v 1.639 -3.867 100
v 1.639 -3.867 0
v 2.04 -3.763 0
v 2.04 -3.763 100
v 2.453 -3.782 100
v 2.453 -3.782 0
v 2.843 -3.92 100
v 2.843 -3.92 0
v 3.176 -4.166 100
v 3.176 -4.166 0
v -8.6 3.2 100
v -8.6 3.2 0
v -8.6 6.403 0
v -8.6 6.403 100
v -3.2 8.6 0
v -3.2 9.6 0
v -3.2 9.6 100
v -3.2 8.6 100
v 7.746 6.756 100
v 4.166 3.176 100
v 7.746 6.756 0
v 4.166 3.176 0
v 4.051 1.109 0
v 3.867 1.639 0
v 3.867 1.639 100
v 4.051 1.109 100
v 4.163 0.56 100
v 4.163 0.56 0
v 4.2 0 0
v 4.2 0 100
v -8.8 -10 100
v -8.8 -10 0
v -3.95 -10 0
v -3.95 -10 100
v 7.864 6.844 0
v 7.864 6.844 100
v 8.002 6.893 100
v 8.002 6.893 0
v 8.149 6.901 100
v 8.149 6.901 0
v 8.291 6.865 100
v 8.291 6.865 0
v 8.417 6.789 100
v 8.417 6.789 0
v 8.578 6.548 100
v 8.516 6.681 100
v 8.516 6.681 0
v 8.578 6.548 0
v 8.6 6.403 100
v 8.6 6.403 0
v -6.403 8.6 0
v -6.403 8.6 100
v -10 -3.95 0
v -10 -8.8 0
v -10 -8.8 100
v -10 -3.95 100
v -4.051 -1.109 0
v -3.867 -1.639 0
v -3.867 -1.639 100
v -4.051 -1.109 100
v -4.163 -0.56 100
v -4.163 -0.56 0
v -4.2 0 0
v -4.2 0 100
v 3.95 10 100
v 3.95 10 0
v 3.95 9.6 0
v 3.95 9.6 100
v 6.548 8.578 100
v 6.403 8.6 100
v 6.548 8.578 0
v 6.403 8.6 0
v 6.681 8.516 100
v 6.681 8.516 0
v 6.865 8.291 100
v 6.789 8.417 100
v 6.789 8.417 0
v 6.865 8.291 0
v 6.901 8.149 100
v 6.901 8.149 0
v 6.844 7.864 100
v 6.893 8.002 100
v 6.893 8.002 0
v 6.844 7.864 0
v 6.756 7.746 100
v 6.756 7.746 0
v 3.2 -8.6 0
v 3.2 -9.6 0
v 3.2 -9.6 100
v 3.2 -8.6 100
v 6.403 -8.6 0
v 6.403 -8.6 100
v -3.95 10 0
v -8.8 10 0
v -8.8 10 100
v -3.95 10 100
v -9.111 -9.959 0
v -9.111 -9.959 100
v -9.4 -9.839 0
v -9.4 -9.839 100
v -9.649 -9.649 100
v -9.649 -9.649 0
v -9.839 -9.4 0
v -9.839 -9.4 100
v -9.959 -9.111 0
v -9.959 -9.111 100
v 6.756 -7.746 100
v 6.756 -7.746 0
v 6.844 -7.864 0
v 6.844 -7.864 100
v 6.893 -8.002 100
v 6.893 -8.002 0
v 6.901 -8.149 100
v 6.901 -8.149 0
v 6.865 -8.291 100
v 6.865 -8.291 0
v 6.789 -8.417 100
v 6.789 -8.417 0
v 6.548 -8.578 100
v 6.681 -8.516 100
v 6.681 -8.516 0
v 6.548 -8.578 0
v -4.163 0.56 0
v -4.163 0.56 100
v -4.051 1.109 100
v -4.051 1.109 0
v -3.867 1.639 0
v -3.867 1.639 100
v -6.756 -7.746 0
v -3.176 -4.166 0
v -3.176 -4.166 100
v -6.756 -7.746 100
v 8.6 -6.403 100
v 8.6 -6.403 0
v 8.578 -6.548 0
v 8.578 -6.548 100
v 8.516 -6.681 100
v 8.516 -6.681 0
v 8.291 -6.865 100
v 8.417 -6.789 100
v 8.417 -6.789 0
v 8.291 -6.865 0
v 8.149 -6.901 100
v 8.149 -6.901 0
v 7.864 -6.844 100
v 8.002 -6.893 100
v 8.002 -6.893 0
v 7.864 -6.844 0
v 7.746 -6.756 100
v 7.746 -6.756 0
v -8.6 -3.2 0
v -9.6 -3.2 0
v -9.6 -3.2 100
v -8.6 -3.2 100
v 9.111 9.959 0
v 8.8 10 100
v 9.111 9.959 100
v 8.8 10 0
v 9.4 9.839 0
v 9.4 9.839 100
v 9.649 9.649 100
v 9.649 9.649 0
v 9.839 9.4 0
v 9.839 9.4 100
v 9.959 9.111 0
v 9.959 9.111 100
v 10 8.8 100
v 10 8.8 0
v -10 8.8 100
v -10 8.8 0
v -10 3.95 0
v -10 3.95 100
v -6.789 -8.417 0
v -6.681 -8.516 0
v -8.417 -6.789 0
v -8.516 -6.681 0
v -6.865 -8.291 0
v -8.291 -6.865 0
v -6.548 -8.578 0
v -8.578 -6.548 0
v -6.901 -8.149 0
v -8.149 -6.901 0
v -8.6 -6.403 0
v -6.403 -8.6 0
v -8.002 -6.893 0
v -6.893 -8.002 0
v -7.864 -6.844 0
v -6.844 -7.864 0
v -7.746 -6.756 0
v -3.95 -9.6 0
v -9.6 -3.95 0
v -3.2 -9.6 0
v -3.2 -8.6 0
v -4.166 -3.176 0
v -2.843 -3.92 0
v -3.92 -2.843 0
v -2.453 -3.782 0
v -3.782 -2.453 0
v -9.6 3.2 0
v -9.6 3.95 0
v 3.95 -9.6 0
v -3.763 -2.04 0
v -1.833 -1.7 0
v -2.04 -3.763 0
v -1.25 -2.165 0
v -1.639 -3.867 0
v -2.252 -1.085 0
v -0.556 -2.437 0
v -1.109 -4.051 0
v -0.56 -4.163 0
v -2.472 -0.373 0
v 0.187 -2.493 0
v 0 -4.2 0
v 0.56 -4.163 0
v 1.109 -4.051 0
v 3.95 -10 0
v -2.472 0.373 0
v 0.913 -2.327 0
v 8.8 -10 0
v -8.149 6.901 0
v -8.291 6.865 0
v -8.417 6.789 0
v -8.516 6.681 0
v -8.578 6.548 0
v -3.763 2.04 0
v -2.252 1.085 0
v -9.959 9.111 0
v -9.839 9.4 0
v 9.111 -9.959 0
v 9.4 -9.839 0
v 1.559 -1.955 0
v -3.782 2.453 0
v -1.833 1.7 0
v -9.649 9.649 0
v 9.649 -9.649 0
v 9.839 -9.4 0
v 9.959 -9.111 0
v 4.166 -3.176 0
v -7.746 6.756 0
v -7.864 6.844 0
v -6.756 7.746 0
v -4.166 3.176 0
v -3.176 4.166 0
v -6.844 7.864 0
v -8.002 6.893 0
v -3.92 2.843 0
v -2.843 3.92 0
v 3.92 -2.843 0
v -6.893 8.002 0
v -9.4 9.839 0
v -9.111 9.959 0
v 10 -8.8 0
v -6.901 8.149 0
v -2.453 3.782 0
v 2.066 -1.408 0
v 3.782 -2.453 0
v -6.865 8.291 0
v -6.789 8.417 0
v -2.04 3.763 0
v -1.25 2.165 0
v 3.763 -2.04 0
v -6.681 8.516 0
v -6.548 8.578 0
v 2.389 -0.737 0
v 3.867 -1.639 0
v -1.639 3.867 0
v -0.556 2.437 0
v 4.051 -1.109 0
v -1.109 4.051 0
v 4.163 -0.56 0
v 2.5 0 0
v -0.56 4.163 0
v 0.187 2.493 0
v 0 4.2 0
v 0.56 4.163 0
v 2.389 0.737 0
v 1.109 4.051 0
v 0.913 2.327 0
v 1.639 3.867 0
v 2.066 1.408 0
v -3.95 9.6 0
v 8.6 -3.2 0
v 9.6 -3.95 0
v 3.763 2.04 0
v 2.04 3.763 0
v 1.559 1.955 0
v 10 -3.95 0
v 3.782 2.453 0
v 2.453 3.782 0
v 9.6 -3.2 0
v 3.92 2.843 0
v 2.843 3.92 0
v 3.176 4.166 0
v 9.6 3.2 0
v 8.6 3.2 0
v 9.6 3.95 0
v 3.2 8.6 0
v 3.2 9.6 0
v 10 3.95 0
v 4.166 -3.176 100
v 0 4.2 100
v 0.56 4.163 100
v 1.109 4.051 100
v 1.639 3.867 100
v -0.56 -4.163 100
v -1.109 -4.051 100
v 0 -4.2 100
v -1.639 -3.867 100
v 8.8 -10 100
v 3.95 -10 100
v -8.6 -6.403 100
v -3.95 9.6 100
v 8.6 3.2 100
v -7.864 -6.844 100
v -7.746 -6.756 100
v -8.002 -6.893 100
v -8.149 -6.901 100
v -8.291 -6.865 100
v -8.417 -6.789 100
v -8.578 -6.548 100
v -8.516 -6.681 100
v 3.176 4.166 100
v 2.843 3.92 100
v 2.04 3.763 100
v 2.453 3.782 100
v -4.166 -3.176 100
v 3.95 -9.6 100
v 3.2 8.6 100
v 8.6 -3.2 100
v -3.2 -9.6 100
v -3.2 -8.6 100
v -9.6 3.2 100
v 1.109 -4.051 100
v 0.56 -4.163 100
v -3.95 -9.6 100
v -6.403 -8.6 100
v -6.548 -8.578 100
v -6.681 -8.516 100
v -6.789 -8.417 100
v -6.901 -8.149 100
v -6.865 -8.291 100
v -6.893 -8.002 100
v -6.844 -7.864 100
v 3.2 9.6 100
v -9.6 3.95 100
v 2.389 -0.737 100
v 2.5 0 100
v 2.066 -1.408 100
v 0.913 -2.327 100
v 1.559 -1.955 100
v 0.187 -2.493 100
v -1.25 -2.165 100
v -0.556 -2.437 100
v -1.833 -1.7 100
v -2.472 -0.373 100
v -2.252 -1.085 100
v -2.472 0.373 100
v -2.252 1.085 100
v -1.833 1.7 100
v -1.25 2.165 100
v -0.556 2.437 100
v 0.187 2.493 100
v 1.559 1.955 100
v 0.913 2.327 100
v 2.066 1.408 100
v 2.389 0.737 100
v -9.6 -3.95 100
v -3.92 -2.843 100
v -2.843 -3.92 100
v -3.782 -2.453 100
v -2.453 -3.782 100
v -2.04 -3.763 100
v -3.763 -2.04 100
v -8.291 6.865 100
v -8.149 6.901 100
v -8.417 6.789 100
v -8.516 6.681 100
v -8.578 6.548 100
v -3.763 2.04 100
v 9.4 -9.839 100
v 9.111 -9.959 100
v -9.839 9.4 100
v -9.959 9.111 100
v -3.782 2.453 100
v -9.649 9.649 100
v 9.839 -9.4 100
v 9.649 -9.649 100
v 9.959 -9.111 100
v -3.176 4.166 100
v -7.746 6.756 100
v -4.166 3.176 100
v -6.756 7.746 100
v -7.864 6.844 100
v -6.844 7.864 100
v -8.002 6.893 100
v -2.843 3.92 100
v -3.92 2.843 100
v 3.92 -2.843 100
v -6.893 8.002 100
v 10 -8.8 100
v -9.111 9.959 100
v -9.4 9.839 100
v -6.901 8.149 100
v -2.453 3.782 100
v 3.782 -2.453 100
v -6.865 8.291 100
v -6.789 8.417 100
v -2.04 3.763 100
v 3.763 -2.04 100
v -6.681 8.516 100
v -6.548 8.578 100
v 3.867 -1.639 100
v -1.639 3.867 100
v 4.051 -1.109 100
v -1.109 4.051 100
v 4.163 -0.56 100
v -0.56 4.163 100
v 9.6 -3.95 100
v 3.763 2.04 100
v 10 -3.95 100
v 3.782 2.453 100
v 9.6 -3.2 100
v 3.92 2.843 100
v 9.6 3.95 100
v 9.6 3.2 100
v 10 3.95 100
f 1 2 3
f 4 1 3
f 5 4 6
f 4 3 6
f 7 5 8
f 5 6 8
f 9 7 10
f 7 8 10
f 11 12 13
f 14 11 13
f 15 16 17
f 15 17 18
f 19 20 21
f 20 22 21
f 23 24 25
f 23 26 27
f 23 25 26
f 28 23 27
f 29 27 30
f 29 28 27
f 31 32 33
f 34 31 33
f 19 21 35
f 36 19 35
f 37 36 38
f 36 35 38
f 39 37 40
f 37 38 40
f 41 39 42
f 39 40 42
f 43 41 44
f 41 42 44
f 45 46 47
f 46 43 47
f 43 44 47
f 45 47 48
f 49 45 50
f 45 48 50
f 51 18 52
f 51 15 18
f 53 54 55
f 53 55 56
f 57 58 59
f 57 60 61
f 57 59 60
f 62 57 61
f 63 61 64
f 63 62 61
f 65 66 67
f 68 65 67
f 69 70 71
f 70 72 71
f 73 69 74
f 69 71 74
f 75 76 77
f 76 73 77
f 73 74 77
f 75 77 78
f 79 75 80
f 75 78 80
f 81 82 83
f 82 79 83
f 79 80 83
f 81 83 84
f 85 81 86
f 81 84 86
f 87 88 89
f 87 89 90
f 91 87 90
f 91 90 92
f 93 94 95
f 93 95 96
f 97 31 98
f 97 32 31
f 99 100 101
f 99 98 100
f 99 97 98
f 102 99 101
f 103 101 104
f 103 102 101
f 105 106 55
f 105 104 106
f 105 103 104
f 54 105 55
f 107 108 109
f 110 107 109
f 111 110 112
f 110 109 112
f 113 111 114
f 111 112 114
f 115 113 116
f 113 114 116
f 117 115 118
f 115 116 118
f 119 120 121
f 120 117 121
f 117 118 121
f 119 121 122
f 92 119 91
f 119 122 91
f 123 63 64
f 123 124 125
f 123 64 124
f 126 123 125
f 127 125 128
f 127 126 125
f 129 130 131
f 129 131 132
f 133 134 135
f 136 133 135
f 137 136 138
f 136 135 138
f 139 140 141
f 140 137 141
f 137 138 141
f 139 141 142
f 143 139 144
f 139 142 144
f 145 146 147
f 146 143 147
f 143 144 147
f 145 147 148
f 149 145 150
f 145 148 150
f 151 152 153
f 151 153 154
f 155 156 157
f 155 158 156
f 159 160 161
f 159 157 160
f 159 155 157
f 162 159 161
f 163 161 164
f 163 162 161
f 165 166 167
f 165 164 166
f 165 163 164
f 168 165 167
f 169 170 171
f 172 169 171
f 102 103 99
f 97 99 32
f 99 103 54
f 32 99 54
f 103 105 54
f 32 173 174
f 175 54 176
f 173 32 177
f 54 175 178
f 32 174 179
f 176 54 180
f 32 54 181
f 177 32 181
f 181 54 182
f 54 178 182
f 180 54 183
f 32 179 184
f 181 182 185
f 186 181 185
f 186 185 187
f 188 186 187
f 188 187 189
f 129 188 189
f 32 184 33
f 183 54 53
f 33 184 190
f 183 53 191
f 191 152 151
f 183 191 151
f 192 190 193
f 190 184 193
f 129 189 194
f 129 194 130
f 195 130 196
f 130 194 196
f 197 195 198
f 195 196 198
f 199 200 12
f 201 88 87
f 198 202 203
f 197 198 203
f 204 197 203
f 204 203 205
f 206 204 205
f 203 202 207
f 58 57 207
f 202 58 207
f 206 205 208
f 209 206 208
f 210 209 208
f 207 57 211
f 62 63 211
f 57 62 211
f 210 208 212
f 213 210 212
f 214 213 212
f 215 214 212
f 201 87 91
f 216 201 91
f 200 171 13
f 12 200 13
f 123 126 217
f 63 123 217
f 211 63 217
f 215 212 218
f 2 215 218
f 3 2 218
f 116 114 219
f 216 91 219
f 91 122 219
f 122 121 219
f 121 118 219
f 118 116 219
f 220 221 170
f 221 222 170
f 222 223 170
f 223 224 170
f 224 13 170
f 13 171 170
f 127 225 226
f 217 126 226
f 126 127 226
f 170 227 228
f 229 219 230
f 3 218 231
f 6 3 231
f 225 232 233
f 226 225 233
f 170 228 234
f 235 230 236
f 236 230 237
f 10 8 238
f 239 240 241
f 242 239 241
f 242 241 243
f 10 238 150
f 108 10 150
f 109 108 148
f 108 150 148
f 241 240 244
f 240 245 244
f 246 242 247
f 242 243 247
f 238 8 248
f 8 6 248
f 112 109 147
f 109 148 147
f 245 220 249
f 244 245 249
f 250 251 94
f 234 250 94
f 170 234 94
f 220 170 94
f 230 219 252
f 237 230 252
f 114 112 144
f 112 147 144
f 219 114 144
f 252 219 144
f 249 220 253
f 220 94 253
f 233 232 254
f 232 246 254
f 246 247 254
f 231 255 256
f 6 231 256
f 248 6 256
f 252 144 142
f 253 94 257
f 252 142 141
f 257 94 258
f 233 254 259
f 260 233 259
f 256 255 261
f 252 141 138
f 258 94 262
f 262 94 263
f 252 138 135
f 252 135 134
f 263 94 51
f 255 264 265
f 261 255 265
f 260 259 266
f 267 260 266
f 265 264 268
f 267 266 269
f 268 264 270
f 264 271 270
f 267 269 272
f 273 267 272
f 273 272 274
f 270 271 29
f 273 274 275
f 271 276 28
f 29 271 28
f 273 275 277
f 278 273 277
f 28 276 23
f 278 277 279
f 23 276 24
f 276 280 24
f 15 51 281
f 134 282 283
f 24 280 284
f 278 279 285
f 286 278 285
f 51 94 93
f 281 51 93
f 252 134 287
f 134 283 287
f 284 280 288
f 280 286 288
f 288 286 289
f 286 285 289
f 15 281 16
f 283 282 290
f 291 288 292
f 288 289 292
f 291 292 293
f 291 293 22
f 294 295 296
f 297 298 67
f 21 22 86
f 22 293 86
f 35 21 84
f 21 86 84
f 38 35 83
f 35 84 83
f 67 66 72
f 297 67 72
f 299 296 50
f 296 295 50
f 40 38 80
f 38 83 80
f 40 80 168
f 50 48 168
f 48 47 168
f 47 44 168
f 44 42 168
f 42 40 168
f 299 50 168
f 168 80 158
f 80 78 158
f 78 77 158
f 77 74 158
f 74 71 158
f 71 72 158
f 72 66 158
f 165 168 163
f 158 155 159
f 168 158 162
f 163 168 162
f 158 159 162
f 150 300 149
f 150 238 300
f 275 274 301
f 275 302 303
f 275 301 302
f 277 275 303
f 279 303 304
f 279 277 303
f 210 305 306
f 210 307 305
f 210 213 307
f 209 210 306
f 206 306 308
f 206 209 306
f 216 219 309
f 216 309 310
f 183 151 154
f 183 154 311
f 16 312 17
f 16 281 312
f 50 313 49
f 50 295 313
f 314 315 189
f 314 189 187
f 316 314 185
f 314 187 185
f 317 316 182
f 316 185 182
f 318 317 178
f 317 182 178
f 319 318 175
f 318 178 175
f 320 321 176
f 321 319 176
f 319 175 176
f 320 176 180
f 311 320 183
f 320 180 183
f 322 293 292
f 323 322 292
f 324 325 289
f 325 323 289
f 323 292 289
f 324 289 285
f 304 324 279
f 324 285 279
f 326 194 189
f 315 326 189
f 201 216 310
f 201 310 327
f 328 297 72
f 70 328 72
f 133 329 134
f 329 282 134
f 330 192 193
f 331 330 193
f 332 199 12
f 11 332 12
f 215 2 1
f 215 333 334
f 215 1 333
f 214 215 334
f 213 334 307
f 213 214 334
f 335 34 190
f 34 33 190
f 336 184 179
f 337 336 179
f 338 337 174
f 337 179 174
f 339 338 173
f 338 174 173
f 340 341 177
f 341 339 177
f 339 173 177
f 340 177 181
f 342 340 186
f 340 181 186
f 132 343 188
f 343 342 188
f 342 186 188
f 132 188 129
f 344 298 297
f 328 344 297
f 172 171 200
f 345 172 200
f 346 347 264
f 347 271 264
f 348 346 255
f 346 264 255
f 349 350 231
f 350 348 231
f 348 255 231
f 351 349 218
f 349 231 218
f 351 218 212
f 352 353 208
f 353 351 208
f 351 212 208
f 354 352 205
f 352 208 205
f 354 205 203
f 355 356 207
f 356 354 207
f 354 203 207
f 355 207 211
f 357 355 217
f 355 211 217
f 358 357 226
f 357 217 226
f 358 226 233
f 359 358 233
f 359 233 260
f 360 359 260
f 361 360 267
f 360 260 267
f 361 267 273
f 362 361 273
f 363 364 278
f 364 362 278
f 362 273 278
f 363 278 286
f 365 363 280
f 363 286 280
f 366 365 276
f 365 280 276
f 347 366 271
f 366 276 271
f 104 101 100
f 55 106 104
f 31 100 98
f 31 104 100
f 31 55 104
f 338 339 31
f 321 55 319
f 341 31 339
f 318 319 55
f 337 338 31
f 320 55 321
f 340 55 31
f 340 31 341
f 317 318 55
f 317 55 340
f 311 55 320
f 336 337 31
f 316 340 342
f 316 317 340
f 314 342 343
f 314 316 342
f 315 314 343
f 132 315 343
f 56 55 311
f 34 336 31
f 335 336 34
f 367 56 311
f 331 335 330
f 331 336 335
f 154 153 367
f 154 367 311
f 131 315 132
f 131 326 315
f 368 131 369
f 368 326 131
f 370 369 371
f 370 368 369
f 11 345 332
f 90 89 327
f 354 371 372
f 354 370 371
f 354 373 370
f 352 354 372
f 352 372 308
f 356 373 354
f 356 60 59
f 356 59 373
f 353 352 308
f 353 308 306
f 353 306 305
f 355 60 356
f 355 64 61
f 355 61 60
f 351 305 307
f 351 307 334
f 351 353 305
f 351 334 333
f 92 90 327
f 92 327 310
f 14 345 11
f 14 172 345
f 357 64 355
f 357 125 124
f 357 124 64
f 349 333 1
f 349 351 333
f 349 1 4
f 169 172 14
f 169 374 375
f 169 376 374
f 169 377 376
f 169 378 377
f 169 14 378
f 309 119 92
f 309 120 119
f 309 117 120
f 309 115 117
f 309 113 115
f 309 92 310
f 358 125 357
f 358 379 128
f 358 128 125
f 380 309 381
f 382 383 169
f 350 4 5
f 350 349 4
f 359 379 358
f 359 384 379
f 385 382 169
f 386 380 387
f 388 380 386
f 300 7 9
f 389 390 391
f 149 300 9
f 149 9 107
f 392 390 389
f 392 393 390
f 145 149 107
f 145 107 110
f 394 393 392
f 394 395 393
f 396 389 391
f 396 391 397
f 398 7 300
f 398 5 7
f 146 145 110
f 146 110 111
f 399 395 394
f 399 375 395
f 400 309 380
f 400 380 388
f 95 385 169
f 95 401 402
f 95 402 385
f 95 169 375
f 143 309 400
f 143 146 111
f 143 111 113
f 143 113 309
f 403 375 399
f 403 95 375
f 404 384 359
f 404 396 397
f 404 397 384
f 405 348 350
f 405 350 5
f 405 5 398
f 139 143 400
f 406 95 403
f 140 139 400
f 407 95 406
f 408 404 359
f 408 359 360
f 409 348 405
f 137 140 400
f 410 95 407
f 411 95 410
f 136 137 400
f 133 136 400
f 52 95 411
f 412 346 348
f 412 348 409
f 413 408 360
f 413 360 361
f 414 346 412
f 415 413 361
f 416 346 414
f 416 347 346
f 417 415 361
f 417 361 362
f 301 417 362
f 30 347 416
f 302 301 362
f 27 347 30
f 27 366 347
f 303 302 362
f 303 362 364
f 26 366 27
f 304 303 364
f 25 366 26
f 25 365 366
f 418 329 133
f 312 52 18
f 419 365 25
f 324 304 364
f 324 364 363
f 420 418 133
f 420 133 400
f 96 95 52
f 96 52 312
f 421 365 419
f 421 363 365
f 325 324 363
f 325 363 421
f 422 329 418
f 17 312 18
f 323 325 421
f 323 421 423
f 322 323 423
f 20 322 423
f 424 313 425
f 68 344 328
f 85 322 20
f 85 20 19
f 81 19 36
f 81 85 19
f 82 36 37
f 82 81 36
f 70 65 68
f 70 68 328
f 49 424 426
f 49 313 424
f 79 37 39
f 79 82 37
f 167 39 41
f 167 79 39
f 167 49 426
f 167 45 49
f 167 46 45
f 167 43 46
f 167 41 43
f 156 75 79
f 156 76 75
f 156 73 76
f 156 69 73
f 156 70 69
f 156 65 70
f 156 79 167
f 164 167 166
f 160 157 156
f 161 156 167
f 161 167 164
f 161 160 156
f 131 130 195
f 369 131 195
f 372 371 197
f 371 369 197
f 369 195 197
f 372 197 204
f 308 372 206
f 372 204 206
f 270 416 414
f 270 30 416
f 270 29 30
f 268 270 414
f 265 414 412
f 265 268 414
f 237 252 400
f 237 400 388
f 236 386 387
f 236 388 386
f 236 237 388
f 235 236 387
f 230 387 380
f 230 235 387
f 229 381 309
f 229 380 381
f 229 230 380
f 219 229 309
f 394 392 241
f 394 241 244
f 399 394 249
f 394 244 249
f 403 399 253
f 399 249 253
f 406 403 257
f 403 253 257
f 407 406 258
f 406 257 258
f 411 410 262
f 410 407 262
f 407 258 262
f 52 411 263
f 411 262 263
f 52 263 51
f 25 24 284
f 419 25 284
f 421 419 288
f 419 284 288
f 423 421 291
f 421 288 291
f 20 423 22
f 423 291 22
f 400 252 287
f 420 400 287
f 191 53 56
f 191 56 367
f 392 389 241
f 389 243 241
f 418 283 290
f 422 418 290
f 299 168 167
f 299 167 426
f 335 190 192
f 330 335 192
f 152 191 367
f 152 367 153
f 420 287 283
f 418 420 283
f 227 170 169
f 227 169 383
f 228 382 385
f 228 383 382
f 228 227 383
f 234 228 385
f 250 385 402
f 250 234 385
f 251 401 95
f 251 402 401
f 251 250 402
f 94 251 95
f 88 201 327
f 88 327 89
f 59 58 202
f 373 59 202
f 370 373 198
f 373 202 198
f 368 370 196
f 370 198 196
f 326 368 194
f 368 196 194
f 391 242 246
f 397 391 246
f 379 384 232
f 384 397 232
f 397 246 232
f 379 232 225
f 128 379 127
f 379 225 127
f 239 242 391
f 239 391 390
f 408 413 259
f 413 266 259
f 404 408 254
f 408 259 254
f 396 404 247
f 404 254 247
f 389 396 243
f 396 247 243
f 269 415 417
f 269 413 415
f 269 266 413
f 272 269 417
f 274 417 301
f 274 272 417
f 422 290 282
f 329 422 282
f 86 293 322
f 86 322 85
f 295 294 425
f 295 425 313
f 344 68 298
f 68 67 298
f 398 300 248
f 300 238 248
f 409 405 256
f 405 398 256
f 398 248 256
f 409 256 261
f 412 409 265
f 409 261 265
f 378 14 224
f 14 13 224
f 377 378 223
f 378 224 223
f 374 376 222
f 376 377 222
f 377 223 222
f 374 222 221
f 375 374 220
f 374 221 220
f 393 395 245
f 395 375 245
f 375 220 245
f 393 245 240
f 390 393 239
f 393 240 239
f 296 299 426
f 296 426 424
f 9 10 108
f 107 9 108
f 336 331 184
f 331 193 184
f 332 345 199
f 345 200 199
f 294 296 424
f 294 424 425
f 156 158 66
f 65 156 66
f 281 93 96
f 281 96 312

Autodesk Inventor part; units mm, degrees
ref_plane "YZ Plane" through (0, 0, 0) normal (1, 0, 0) x (0, 1, 0)
ref_plane "Start Plane" through (0, 0, 0) normal (0, 0, 1) x (1, 0, 0)
ref_plane "End Plane" through (0, 0, 100) normal (0, 0, 1) x (1, 0, 0)
sketch "Sketch2" plane through (0, 0, 0) normal (0, 0, 1) x (1, 0, 0)
  circle A0 centre (0, 0) radius 2.5
  circle A1 centre (0, 0) radius 4.2 construction
  line L0 (10, -10) -> (-10, -10) construction
  line L1 (-10, -10) -> (-10, 10) construction
  line L2 (-10, 10) -> (10, 10) construction
  line L3 (10, 10) -> (10, -10) construction
  line L4 (10, -10) -> (-10, 10) construction
  line L5 (-10, -10) -> (10, 10) construction
  line L6 (-4.1658, 3.1759) -> (-7.7464, 6.7565)
  line L7 (-10, 8.8) -> (-10, 3.95)
  line L8 (-10, 3.95) -> (-9.6, 3.95)
  line L9 (-9.6, 3.95) -> (-9.6, 3.2)
  line L10 (-9.6, 3.2) -> (-8.6, 3.2)
  line L11 (-8.6, 3.2) -> (-8.6, 6.4029)
  line L12 (-10, 0) -> (0, 0) construction
  line L13 (-8.8, 10) -> (-3.95, 10)
  line L14 (-3.95, 10) -> (-3.95, 9.6)
  line L15 (-3.95, 9.6) -> (-3.2, 9.6)
  line L16 (-3.2, 9.6) -> (-3.2, 8.6)
  line L17 (-3.2, 8.6) -> (-6.4029, 8.6)
  arc A2 (-8.8, 10) -> (-10, 8.8) centre (-8.8, 8.8) ccw
  arc A3 (-6.4029, 8.6) -> (-6.7565, 7.7464) centre (-6.4029, 8.1) ccw
  arc A4 (-7.7464, 6.7565) -> (-8.6, 6.4029) centre (-8.1, 6.4029) ccw
  arc A5 (-3.8668, 1.6394) -> (-4.2, 0) centre (0, 0) ccw
  arc A6 (-3.8668, 1.6394) -> (-4.1658, 3.1759) centre (-5.1558, 2.1859) ccw
  line L18 (-3.1759, 4.1658) -> (-6.7565, 7.7464)
  arc A7 (0, 4.2) -> (-1.6394, 3.8668) centre (0, 0) ccw
  arc A8 (-3.1759, 4.1658) -> (-1.6394, 3.8668) centre (-2.1859, 5.1558) ccw
  line L19 (-3.2, -9.6) -> (-3.2, -8.6)
  line L20 (-3.2, -8.6) -> (-6.4029, -8.6)
  line L21 (-8.8, -10) -> (-3.95, -10)
  arc A9 (-1.6394, -3.8668) -> (-3.1759, -4.1658) centre (-2.1859, -5.1558) ccw
  line L22 (-3.1759, -4.1658) -> (-6.7565, -7.7464)
  line L23 (0, -10) -> (0, 0) construction
  arc A10 (-4.1658, -3.1759) -> (-3.8668, -1.6394) centre (-5.1558, -2.1859) ccw
  line L24 (-4.1658, -3.1759) -> (-7.7464, -6.7565)
  line L25 (-3.95, -9.6) -> (-3.2, -9.6)
  line L26 (-3.95, -10) -> (-3.95, -9.6)
  arc A11 (-1.6394, -3.8668) -> (0, -4.2) centre (0, 0) ccw
  arc A12 (-4.2, 0) -> (-3.8668, -1.6394) centre (0, 0) ccw
  line L27 (-9.6, -3.95) -> (-9.6, -3.2)
  arc A13 (-6.7565, -7.7464) -> (-6.4029, -8.6) centre (-6.4029, -8.1) ccw
  arc A14 (-8.6, -6.4029) -> (-7.7464, -6.7565) centre (-8.1, -6.4029) ccw
  line L28 (-8.6, -3.2) -> (-8.6, -6.4029)
  line L29 (-9.6, -3.2) -> (-8.6, -3.2)
  line L30 (-10, -3.95) -> (-9.6, -3.95)
  line L31 (-10, -8.8) -> (-10, -3.95)
  arc A15 (-10, -8.8) -> (-8.8, -10) centre (-8.8, -8.8) ccw
  line L32 (9.6, -3.2) -> (8.6, -3.2)
  line L33 (8.6, -3.2) -> (8.6, -6.4029)
  line L34 (10, -8.8) -> (10, -3.95)
  arc A16 (3.8668, -1.6394) -> (4.1658, -3.1759) centre (5.1558, -2.1859) ccw
  line L35 (4.1658, -3.1759) -> (7.7464, -6.7565)
  line L36 (10, 0) -> (0, 0) construction
  arc A17 (3.1759, -4.1658) -> (1.6394, -3.8668) centre (2.1859, -5.1558) ccw
  line L37 (3.1759, -4.1658) -> (6.7565, -7.7464)
  line L38 (9.6, -3.95) -> (9.6, -3.2)
  line L39 (10, -3.95) -> (9.6, -3.95)
  arc A18 (3.8668, -1.6394) -> (4.2, 0) centre (0, 0) ccw
  arc A19 (0, -4.2) -> (1.6394, -3.8668) centre (0, 0) ccw
  line L40 (3.95, -9.6) -> (3.2, -9.6)
  arc A20 (7.7464, -6.7565) -> (8.6, -6.4029) centre (8.1, -6.4029) ccw
  arc A21 (6.4029, -8.6) -> (6.7565, -7.7464) centre (6.4029, -8.1) ccw
  line L41 (3.2, -8.6) -> (6.4029, -8.6)
  line L42 (3.2, -9.6) -> (3.2, -8.6)
  line L43 (3.95, -10) -> (3.95, -9.6)
  line L44 (8.8, -10) -> (3.95, -10)
  arc A22 (8.8, -10) -> (10, -8.8) centre (8.8, -8.8) ccw
  line L45 (3.2, 9.6) -> (3.2, 8.6)
  line L46 (3.2, 8.6) -> (6.4029, 8.6)
  line L47 (8.8, 10) -> (3.95, 10)
  arc A23 (1.6394, 3.8668) -> (3.1759, 4.1658) centre (2.1859, 5.1558) ccw
  line L48 (3.1759, 4.1658) -> (6.7565, 7.7464)
  line L49 (0, 10) -> (0, 0) construction
  arc A24 (4.1658, 3.1759) -> (3.8668, 1.6394) centre (5.1558, 2.1859) ccw
  line L50 (4.1658, 3.1759) -> (7.7464, 6.7565)
  line L51 (3.95, 9.6) -> (3.2, 9.6)
  line L52 (3.95, 10) -> (3.95, 9.6)
  arc A25 (1.6394, 3.8668) -> (0, 4.2) centre (0, 0) ccw
  arc A26 (4.2, 0) -> (3.8668, 1.6394) centre (0, 0) ccw
  line L53 (9.6, 3.95) -> (9.6, 3.2)
  arc A27 (6.7565, 7.7464) -> (6.4029, 8.6) centre (6.4029, 8.1) ccw
  arc A28 (8.6, 6.4029) -> (7.7464, 6.7565) centre (8.1, 6.4029) ccw
  line L54 (8.6, 3.2) -> (8.6, 6.4029)
  line L55 (9.6, 3.2) -> (8.6, 3.2)
  line L56 (10, 3.95) -> (9.6, 3.95)
  line L57 (10, 8.8) -> (10, 3.95)
  arc A29 (10, 8.8) -> (8.8, 10) centre (8.8, 8.8) ccw
  point P0 (-3.4233, 2.4333)
  point P1 (-8.6, 7.6101)
  point P2 (-7.6101, 8.6)
  point P3 (-7.6101, -8.6)
  point P4 (-10, -10)
  point P5 (-2.4333, -3.4233)
  point P6 (-8.6, -7.6101)
  point P7 (8.6, -7.6101)
  point P8 (10, -10)
  point P9 (3.4233, -2.4333)
  point P10 (7.6101, -8.6)
  point P11 (7.6101, 8.6)
  point P12 (10, 10)
  point P13 (2.4333, 3.4233)
  point P14 (8.6, 7.6101)
  point P15 (-4.2, 0)
  point P16 (0, -4.2)
  point P17 (4.2, 0)
  point P18 (0, 4.2)
  dimension "d8" = 5
  dimension "d9" = 8.4
  dimension "d10" = 20
  dimension "d11" = 20
  dimension "d13" = 1.4
  dimension "d14" = 3.2
  dimension "d15" = 3.95
  dimension "d16" = 0.4
  dimension "d18" = 1.2
  dimension "d19" = 0.5
  dimension "d20" = 1.4
  dimension "d21" = 1.4
  dimension "d24" = 360
extrude "Body" add sketch "Sketch2" along normal up to surface (100 mm away) from surface at 0
sketch "Sketch11" plane through (0, 0, 0) normal (0, 0, 1) x (1, 0, 0)
  line L0 (0, 0) -> (10, 0)
ref_plane "Work Plane11" through (0, 0, 0) normal (0, -1, 0) x (1, 0, 0)
sketch "Sketch12" plane through (0, 0, 0) normal (0, -1, 0) x (1, 0, 0)
  line L0 (-14, 0) -> (14, 0)
  line L1 (-14, 100) -> (14, 100)
  dimension "d53" = 100
equation "\"G_OFFSET_START\" = 0"
equation "\"G_OFFSET_END\" = 0"
equation "\"G_L\" = d53"
equation "\"G_OFFSET_START1\" = 0"
equation "\"G_OFFSET_END1\" = 0"
equation "\"G_OFFSET_START2\" = 0"
equation "\"G_OFFSET_END2\" = 0"
properties part number "2020Profile" material "Aluminum 6061"
